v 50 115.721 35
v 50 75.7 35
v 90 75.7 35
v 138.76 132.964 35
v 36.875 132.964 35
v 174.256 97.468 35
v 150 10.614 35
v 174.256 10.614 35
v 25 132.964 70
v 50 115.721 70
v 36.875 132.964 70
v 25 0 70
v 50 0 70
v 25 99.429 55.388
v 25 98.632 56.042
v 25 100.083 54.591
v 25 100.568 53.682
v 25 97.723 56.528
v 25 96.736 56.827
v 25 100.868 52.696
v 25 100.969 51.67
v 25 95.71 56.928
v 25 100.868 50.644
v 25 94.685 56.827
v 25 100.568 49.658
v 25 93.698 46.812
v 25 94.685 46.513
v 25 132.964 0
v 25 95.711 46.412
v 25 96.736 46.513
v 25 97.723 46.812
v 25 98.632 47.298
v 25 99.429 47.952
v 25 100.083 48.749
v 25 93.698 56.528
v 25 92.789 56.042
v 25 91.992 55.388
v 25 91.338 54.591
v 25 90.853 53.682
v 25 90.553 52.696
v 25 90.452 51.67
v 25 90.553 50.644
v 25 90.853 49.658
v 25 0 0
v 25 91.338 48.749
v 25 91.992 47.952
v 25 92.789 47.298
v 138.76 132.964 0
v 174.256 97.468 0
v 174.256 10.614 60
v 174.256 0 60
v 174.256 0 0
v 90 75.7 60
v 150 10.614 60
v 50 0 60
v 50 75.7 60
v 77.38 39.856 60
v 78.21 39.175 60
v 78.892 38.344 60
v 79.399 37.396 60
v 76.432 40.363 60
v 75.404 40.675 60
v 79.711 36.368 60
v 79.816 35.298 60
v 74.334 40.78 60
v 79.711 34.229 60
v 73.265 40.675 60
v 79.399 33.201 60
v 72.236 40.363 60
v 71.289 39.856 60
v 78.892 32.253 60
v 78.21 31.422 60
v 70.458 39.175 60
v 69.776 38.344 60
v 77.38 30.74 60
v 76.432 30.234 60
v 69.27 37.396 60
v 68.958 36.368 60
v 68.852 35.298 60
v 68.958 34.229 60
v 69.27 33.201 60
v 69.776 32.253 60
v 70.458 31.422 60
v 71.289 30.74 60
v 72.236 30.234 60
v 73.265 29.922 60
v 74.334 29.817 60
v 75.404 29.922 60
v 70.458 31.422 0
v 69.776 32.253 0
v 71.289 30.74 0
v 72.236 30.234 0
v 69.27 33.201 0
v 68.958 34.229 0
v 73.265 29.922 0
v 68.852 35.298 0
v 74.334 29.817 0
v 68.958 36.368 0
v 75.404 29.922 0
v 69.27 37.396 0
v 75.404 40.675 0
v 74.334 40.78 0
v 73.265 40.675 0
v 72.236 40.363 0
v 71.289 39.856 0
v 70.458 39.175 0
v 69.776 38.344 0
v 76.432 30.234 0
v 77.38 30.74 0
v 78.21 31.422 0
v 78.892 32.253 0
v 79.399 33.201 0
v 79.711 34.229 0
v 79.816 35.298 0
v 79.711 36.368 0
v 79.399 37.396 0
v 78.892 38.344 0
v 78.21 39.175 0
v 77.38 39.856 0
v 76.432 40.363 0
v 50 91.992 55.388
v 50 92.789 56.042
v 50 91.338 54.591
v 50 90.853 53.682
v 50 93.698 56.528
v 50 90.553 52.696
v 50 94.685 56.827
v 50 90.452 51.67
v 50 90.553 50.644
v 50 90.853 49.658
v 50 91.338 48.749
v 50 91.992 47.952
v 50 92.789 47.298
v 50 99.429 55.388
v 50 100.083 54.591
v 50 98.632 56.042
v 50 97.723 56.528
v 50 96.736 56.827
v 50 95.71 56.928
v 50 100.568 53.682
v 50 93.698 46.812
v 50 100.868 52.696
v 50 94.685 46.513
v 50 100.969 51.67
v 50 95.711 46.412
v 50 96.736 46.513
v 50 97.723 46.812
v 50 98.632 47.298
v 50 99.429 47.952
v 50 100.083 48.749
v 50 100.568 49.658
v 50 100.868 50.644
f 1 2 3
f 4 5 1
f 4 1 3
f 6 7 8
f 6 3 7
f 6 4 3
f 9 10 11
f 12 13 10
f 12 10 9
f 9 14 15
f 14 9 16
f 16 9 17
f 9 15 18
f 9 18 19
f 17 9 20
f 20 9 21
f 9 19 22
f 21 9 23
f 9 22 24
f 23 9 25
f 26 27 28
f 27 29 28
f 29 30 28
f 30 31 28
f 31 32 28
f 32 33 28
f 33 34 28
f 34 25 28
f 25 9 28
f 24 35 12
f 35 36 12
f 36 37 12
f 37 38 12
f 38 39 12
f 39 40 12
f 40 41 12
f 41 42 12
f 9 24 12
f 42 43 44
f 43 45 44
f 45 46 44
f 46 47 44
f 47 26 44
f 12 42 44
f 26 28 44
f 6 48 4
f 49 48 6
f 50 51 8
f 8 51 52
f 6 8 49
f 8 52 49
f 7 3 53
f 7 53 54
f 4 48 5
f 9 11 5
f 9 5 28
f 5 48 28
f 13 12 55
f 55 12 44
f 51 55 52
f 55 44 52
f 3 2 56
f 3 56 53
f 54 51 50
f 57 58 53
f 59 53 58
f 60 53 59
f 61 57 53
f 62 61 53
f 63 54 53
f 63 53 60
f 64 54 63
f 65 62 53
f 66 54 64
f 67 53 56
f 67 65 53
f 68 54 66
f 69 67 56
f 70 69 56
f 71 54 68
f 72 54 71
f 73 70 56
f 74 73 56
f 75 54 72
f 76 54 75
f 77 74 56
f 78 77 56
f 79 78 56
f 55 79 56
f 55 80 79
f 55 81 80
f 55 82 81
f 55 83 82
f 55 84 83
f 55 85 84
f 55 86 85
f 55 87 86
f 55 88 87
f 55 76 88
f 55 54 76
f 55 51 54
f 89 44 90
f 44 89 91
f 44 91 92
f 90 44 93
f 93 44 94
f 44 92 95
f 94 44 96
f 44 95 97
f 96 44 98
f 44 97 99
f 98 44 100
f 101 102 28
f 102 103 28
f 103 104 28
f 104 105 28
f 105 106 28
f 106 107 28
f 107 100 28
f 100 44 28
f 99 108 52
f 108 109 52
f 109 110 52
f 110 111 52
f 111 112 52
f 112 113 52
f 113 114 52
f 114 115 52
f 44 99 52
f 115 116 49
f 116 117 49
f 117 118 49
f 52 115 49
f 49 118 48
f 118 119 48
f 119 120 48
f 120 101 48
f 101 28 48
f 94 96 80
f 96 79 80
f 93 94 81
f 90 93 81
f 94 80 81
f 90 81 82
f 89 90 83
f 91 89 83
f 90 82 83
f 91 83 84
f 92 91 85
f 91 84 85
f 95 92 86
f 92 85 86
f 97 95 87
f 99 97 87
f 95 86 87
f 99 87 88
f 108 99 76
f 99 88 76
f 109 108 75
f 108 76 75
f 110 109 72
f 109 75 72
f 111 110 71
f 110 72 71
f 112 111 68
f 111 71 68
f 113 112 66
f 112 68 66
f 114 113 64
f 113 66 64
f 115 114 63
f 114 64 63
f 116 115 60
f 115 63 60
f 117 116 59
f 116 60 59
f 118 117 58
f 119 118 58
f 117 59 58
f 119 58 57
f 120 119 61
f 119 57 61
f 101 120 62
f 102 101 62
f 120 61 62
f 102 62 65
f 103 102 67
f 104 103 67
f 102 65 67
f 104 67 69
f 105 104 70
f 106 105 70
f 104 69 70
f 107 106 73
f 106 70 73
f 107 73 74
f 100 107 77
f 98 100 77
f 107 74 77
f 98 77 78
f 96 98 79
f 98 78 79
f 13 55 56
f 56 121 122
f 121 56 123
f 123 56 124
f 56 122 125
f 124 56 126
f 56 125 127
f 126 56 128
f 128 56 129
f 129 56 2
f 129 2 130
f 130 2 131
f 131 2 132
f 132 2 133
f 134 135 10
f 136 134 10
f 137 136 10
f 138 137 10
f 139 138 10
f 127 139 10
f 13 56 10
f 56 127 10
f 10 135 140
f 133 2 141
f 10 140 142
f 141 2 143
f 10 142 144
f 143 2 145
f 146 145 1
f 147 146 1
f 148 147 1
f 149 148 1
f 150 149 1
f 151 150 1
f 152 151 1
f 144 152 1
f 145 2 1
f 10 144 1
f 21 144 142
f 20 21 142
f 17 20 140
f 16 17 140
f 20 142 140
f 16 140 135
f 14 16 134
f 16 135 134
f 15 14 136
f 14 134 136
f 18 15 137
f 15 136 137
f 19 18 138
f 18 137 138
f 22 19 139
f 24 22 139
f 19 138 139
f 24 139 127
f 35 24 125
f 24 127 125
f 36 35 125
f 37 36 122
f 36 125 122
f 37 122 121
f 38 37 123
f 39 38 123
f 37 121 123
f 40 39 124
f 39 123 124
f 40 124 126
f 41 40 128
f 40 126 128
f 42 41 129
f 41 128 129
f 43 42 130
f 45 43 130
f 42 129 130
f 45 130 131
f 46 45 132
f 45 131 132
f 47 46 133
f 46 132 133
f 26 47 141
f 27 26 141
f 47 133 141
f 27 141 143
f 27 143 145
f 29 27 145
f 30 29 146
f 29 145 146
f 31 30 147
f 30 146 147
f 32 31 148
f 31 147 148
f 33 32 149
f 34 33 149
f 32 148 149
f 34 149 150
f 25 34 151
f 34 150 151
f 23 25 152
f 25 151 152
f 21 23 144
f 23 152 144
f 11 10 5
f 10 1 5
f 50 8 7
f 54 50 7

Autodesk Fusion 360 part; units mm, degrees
sketch "Sketch1" plane through (0, 0, 0) normal (0, 0, 1) x (1, 0, 0)
  line L0 (0, 0) -> (174.2555, 0)
  line L1 (174.2555, 0) -> (174.2555, 132.964)
  line L2 (174.2555, 132.964) -> (0, 132.964)
  line L3 (0, 132.964) -> (0, 0)
  line L4 (138.7597, 132.964) -> (174.2555, 97.4682)
  line L5 (138.7597, 132.964) -> (188.9583, 132.964) construction
  dimension "d1" = 45
extrude "Extrude1" add sketch "Sketch1" along normal blind 35 contours L0 L1 L2 L3 L4
extrude "Extrude2" cut 1 faces at (0, 88.6427, 11.6667) along direction (1, 0, 0) blind 25
sketch "Sketch2" plane through (0, 0, 35) normal (0, 0, 1) x (-1, 0, 0)
  line L0 (-25, -132.964) -> (-25, 0)
  line L1 (-25, 0) -> (-174.2555, 0)
  line L2 (-174.2555, 0) -> (-174.2555, -97.4682)
  line L3 (-174.2555, -97.4682) -> (-138.7597, -132.964)
  line L4 (-138.7597, -132.964) -> (-25, -132.964)
  line L5 (-25, -132.964) -> (-25, 0)
  line L6 (-50, 0) -> (-50, -110)
  line L7 (-50, -110) -> (-50, -115.7208)
  line L8 (-50, -115.7208) -> (-36.875, -132.964)
extrude "Extrude3" add sketch "Sketch2" along normal blind 35 contours L0 L1 L4 L5 L6 L7 L8
sketch "Sketch3" plane through (0, 0, 35) normal (0, 0, 1) x (-1, 0, 0)
  line L0 (-36.875, -132.964) -> (-50, -115.7208)
  line L1 (-50, -115.7208) -> (-50, 0)
  line L2 (-50, 0) -> (-174.2555, 0)
  line L3 (-174.2555, 0) -> (-174.2555, -97.4682)
  line L4 (-174.2555, -97.4682) -> (-138.7597, -132.964)
  line L5 (-138.7597, -132.964) -> (-36.875, -132.964)
  line L6 (-174.2555, -10.6135) -> (-155, -10.6135)
  line L7 (-50, 0) -> (-174.2555, 0)
  line L8 (-155, -10.6135) -> (-150, -10.6135)
  line L9 (-50, -75.7001) -> (-90, -75.7001)
  line L10 (-90, -75.7001) -> (-150, -10.6135)
extrude "Extrude4" add sketch "Sketch3" along normal blind 25 contours L1 L2 L3 L6 L7 L8 L9 L10
sketch "Sketch4" plane through (50, 0, 0) normal (1, 0, 0) x (0, 1, 0)
  line L0 (75.7001, 60) -> (75.7001, 35)
  line L1 (75.7001, 35) -> (115.7208, 35)
  line L2 (115.7208, 35) -> (115.7208, 70)
  line L3 (115.7208, 70) -> (0, 70)
  line L4 (0, 70) -> (0, 60)
  line L5 (0, 60) -> (75.7001, 60)
  circle A0 centre (95.7105, 51.6698) radius 5.2582
extrude "Extrude5" cut sketch "Sketch4" against normal blind 50 contours A0
sketch "Sketch5" plane through (0, 0, 60) normal (0, 0, 1) x (-1, 0, 0)
  line L0 (-174.2555, -10.6135) -> (-150, -10.6135)
  line L1 (-150, -10.6135) -> (-90, -75.7001)
  line L2 (-90, -75.7001) -> (-50, -75.7001)
  line L3 (-50, -75.7001) -> (-50, 0)
  line L4 (-50, 0) -> (-174.2555, 0)
  line L5 (-174.2555, 0) -> (-174.2555, -10.6135)
  circle A0 centre (-74.3342, -35.2984) radius 5.4818
extrude "Extrude6" cut sketch "Sketch5" against normal blind 150 contours A0
